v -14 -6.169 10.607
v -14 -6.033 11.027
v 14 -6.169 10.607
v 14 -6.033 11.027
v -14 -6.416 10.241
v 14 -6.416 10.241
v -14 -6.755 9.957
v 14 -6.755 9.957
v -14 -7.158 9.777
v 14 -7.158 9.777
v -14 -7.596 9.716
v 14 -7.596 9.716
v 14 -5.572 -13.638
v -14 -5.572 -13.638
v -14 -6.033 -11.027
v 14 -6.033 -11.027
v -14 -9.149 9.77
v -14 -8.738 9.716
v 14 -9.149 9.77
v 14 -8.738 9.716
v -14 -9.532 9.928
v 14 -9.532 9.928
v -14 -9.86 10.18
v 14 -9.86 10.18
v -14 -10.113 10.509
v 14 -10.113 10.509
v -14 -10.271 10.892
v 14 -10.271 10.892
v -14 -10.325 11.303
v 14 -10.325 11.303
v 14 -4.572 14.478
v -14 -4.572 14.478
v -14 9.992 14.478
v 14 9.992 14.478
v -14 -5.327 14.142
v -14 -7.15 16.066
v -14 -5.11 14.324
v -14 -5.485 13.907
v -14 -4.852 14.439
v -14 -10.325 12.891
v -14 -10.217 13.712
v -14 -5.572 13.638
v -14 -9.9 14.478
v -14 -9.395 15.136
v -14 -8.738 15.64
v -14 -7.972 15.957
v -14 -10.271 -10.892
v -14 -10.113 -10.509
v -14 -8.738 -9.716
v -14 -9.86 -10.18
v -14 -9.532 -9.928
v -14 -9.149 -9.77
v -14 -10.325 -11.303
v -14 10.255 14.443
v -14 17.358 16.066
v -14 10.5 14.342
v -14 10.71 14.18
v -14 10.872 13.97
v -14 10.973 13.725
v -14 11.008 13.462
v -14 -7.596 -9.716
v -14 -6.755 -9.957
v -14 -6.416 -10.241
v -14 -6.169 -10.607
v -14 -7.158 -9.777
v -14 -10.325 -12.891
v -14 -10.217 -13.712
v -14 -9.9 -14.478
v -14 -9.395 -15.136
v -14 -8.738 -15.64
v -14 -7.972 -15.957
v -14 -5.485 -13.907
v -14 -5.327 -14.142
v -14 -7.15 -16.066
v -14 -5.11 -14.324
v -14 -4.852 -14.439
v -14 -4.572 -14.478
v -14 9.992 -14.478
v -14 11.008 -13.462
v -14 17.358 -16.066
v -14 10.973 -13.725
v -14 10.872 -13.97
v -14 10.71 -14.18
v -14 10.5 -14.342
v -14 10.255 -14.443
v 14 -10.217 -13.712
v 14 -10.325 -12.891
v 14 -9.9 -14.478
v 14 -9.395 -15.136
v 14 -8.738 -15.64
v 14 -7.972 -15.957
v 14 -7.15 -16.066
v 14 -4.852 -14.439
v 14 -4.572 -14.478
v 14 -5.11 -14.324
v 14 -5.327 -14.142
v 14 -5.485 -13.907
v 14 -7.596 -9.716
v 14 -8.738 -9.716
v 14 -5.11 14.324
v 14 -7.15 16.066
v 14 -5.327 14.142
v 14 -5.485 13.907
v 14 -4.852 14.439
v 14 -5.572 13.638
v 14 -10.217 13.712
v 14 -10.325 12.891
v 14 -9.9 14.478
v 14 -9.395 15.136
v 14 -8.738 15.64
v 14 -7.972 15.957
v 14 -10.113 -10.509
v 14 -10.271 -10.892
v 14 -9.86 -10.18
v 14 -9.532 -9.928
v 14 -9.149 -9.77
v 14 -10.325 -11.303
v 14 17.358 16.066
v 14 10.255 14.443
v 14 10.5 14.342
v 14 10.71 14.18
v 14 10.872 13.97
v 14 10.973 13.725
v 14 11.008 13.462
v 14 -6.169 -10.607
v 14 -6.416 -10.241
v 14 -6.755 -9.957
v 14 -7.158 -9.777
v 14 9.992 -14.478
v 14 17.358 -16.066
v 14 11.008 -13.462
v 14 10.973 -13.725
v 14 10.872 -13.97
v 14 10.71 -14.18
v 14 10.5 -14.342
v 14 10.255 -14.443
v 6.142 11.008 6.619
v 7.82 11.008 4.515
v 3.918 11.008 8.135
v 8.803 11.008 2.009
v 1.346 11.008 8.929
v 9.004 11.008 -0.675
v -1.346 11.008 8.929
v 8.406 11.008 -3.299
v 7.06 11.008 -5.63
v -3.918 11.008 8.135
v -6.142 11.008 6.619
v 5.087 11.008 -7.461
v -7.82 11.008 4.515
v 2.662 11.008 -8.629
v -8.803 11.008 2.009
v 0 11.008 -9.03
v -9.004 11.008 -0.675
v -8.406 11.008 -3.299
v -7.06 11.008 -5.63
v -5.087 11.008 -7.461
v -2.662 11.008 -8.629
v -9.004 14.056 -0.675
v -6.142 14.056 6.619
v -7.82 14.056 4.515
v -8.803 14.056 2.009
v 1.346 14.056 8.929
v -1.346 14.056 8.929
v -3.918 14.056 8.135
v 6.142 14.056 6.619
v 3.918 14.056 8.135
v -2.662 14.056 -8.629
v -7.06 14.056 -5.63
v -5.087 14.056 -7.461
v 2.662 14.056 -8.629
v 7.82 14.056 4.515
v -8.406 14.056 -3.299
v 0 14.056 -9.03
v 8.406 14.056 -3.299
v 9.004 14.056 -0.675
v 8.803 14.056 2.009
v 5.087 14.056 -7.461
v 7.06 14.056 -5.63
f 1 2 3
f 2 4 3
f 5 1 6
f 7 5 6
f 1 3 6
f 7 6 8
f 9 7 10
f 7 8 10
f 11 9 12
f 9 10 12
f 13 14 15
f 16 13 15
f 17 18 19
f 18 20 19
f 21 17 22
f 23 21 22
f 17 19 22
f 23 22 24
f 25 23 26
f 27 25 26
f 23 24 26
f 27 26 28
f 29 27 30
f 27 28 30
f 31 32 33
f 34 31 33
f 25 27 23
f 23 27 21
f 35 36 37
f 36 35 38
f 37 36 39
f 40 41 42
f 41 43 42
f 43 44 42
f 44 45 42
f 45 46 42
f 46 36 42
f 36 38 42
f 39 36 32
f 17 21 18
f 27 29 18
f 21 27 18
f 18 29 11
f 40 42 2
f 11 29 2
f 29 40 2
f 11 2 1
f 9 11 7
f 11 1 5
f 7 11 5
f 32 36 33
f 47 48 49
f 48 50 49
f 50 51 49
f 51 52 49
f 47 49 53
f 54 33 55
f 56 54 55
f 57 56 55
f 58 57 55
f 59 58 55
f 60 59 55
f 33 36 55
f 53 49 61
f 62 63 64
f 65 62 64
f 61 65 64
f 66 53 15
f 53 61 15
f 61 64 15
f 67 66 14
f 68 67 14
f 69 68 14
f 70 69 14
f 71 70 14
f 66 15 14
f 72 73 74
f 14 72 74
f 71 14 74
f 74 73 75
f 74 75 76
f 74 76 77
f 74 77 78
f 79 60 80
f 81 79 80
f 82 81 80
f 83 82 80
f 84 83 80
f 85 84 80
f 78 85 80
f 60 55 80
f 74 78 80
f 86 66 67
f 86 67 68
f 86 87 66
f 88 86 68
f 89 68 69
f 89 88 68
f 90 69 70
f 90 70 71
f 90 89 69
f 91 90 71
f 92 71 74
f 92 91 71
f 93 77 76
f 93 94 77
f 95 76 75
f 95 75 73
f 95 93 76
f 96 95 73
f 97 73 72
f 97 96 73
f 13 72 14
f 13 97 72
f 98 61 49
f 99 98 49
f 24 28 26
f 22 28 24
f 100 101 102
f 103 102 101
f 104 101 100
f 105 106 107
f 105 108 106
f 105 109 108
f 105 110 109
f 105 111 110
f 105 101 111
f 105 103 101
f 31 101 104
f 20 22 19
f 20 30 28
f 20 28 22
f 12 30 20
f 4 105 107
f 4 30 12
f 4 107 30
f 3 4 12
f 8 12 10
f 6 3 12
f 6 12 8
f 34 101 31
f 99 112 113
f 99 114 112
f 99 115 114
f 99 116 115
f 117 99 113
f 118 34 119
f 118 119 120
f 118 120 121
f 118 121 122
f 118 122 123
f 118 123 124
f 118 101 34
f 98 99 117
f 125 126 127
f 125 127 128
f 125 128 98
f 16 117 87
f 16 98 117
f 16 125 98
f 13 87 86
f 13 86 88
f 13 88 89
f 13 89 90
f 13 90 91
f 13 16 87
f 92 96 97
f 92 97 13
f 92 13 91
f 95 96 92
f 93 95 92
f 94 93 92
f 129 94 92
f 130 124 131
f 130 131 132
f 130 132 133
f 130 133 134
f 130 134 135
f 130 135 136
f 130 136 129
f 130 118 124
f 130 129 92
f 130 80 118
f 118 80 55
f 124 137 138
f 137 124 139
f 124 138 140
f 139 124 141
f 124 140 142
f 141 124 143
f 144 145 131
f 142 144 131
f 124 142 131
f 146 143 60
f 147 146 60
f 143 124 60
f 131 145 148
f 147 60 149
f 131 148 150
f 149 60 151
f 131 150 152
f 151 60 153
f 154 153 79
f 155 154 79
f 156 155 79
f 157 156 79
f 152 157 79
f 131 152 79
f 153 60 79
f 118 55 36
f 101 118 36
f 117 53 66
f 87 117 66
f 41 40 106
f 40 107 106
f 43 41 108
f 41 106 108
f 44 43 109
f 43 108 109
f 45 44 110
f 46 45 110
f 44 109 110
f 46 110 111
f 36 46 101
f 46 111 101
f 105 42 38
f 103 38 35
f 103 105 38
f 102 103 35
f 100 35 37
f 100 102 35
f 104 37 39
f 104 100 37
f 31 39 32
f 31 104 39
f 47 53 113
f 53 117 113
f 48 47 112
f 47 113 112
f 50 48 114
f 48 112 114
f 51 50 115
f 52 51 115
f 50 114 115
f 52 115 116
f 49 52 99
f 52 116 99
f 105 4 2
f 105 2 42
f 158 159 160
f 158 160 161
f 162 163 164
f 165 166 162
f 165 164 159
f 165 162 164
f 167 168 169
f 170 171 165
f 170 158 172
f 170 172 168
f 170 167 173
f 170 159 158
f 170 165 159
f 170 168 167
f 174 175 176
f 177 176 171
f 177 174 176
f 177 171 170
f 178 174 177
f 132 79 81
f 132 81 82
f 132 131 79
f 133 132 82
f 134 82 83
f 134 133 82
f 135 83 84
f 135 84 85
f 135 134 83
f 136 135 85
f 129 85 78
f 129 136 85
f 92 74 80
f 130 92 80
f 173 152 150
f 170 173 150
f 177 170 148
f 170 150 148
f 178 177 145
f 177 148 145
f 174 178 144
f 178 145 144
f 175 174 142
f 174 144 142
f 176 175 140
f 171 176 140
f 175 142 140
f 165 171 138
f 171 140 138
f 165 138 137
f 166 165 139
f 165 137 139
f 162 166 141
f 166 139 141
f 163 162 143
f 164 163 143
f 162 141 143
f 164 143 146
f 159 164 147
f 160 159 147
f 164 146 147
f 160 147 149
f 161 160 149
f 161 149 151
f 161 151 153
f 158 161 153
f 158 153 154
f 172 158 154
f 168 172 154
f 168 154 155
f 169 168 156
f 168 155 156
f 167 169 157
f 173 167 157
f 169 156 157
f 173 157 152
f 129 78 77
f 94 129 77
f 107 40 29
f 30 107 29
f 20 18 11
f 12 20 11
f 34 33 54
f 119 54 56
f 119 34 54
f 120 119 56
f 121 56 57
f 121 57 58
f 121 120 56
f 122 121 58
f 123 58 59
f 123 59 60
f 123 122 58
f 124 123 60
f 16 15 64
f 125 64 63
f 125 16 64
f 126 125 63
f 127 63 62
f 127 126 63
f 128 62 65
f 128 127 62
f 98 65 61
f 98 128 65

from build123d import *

# Parameters (mm, degrees)
BOSS_EXTRUDE1_DEPTH      = 14
BOSS_EXTRUDE1_DEPTH_BACK = 14
FILLET2_R                = 3.175
FILLET3_R                = 1.016
FILLET4_R                = 1.5875
SKETCH3_R                = 9.0297
CUT_EXTRUDE1_DEPTH       = 3.048


with BuildPart() as part:
    # Sketch1 → Boss-Extrude1 (new, two sides: drawn at the far end of the back side and taken through both)
    with BuildSketch(Plane(origin=(0, 0, 0), x_dir=(0, 0, -1), z_dir=(1, 0, 0)).offset(-BOSS_EXTRUDE1_DEPTH_BACK)):
        Polygon((-16.0655, -10.325348422), (-9.7155, -10.325348422), (-9.7155, -6.263815771), (-14.478, -5.424058525), (-14.478, 11.008), (0, 11.008), (14.478, 11.008), (14.478, -5.424058525), (9.7155, -6.263815771), (9.7155, -10.325348422), (16.0655, -10.325348422), (16.0655, 17.358), (0, 17.358), (-16.0655, 17.358), align=None)
    extrude(amount=BOSS_EXTRUDE1_DEPTH + BOSS_EXTRUDE1_DEPTH_BACK)

    # Fillet2
    fillet2_edges = [part.edges().sort_by_distance(p)[0] for p in [
        (0, -10.325348422, 16.0655),
        (0, -10.325348422, -16.0655),
    ]]
    fillet(fillet2_edges, radius=FILLET2_R)

    # Fillet3
    fillet3_edges = [part.edges().sort_by_distance(p)[0] for p in [
        (0, -5.424058525, -14.478),
        (0, 11.008, -14.478),
        (0, 11.008, 14.478),
        (0, -5.424058525, 14.478),
    ]]
    fillet(fillet3_edges, radius=FILLET3_R)

    # Fillet4
    fillet4_edges = [part.edges().sort_by_distance(p)[0] for p in [
        (0, -6.263815771, 9.7155),
        (0, -10.325348422, 9.7155),
        (0, -10.325348422, -9.7155),
        (0, -6.263815771, -9.7155),
    ]]
    fillet(fillet4_edges, radius=FILLET4_R)

    # Sketch3 → Cut-Extrude1 (cut)
    with BuildSketch(Plane(origin=(0, 11.008, 0), x_dir=(-1, 0, 0), z_dir=(0, -1, 0))):
        with Locations(Location((0, 0, 0), (0, 0, 90))):
            Circle(SKETCH3_R)
    extrude(amount=-CUT_EXTRUDE1_DEPTH, mode=Mode.SUBTRACT)


solid = part.part
